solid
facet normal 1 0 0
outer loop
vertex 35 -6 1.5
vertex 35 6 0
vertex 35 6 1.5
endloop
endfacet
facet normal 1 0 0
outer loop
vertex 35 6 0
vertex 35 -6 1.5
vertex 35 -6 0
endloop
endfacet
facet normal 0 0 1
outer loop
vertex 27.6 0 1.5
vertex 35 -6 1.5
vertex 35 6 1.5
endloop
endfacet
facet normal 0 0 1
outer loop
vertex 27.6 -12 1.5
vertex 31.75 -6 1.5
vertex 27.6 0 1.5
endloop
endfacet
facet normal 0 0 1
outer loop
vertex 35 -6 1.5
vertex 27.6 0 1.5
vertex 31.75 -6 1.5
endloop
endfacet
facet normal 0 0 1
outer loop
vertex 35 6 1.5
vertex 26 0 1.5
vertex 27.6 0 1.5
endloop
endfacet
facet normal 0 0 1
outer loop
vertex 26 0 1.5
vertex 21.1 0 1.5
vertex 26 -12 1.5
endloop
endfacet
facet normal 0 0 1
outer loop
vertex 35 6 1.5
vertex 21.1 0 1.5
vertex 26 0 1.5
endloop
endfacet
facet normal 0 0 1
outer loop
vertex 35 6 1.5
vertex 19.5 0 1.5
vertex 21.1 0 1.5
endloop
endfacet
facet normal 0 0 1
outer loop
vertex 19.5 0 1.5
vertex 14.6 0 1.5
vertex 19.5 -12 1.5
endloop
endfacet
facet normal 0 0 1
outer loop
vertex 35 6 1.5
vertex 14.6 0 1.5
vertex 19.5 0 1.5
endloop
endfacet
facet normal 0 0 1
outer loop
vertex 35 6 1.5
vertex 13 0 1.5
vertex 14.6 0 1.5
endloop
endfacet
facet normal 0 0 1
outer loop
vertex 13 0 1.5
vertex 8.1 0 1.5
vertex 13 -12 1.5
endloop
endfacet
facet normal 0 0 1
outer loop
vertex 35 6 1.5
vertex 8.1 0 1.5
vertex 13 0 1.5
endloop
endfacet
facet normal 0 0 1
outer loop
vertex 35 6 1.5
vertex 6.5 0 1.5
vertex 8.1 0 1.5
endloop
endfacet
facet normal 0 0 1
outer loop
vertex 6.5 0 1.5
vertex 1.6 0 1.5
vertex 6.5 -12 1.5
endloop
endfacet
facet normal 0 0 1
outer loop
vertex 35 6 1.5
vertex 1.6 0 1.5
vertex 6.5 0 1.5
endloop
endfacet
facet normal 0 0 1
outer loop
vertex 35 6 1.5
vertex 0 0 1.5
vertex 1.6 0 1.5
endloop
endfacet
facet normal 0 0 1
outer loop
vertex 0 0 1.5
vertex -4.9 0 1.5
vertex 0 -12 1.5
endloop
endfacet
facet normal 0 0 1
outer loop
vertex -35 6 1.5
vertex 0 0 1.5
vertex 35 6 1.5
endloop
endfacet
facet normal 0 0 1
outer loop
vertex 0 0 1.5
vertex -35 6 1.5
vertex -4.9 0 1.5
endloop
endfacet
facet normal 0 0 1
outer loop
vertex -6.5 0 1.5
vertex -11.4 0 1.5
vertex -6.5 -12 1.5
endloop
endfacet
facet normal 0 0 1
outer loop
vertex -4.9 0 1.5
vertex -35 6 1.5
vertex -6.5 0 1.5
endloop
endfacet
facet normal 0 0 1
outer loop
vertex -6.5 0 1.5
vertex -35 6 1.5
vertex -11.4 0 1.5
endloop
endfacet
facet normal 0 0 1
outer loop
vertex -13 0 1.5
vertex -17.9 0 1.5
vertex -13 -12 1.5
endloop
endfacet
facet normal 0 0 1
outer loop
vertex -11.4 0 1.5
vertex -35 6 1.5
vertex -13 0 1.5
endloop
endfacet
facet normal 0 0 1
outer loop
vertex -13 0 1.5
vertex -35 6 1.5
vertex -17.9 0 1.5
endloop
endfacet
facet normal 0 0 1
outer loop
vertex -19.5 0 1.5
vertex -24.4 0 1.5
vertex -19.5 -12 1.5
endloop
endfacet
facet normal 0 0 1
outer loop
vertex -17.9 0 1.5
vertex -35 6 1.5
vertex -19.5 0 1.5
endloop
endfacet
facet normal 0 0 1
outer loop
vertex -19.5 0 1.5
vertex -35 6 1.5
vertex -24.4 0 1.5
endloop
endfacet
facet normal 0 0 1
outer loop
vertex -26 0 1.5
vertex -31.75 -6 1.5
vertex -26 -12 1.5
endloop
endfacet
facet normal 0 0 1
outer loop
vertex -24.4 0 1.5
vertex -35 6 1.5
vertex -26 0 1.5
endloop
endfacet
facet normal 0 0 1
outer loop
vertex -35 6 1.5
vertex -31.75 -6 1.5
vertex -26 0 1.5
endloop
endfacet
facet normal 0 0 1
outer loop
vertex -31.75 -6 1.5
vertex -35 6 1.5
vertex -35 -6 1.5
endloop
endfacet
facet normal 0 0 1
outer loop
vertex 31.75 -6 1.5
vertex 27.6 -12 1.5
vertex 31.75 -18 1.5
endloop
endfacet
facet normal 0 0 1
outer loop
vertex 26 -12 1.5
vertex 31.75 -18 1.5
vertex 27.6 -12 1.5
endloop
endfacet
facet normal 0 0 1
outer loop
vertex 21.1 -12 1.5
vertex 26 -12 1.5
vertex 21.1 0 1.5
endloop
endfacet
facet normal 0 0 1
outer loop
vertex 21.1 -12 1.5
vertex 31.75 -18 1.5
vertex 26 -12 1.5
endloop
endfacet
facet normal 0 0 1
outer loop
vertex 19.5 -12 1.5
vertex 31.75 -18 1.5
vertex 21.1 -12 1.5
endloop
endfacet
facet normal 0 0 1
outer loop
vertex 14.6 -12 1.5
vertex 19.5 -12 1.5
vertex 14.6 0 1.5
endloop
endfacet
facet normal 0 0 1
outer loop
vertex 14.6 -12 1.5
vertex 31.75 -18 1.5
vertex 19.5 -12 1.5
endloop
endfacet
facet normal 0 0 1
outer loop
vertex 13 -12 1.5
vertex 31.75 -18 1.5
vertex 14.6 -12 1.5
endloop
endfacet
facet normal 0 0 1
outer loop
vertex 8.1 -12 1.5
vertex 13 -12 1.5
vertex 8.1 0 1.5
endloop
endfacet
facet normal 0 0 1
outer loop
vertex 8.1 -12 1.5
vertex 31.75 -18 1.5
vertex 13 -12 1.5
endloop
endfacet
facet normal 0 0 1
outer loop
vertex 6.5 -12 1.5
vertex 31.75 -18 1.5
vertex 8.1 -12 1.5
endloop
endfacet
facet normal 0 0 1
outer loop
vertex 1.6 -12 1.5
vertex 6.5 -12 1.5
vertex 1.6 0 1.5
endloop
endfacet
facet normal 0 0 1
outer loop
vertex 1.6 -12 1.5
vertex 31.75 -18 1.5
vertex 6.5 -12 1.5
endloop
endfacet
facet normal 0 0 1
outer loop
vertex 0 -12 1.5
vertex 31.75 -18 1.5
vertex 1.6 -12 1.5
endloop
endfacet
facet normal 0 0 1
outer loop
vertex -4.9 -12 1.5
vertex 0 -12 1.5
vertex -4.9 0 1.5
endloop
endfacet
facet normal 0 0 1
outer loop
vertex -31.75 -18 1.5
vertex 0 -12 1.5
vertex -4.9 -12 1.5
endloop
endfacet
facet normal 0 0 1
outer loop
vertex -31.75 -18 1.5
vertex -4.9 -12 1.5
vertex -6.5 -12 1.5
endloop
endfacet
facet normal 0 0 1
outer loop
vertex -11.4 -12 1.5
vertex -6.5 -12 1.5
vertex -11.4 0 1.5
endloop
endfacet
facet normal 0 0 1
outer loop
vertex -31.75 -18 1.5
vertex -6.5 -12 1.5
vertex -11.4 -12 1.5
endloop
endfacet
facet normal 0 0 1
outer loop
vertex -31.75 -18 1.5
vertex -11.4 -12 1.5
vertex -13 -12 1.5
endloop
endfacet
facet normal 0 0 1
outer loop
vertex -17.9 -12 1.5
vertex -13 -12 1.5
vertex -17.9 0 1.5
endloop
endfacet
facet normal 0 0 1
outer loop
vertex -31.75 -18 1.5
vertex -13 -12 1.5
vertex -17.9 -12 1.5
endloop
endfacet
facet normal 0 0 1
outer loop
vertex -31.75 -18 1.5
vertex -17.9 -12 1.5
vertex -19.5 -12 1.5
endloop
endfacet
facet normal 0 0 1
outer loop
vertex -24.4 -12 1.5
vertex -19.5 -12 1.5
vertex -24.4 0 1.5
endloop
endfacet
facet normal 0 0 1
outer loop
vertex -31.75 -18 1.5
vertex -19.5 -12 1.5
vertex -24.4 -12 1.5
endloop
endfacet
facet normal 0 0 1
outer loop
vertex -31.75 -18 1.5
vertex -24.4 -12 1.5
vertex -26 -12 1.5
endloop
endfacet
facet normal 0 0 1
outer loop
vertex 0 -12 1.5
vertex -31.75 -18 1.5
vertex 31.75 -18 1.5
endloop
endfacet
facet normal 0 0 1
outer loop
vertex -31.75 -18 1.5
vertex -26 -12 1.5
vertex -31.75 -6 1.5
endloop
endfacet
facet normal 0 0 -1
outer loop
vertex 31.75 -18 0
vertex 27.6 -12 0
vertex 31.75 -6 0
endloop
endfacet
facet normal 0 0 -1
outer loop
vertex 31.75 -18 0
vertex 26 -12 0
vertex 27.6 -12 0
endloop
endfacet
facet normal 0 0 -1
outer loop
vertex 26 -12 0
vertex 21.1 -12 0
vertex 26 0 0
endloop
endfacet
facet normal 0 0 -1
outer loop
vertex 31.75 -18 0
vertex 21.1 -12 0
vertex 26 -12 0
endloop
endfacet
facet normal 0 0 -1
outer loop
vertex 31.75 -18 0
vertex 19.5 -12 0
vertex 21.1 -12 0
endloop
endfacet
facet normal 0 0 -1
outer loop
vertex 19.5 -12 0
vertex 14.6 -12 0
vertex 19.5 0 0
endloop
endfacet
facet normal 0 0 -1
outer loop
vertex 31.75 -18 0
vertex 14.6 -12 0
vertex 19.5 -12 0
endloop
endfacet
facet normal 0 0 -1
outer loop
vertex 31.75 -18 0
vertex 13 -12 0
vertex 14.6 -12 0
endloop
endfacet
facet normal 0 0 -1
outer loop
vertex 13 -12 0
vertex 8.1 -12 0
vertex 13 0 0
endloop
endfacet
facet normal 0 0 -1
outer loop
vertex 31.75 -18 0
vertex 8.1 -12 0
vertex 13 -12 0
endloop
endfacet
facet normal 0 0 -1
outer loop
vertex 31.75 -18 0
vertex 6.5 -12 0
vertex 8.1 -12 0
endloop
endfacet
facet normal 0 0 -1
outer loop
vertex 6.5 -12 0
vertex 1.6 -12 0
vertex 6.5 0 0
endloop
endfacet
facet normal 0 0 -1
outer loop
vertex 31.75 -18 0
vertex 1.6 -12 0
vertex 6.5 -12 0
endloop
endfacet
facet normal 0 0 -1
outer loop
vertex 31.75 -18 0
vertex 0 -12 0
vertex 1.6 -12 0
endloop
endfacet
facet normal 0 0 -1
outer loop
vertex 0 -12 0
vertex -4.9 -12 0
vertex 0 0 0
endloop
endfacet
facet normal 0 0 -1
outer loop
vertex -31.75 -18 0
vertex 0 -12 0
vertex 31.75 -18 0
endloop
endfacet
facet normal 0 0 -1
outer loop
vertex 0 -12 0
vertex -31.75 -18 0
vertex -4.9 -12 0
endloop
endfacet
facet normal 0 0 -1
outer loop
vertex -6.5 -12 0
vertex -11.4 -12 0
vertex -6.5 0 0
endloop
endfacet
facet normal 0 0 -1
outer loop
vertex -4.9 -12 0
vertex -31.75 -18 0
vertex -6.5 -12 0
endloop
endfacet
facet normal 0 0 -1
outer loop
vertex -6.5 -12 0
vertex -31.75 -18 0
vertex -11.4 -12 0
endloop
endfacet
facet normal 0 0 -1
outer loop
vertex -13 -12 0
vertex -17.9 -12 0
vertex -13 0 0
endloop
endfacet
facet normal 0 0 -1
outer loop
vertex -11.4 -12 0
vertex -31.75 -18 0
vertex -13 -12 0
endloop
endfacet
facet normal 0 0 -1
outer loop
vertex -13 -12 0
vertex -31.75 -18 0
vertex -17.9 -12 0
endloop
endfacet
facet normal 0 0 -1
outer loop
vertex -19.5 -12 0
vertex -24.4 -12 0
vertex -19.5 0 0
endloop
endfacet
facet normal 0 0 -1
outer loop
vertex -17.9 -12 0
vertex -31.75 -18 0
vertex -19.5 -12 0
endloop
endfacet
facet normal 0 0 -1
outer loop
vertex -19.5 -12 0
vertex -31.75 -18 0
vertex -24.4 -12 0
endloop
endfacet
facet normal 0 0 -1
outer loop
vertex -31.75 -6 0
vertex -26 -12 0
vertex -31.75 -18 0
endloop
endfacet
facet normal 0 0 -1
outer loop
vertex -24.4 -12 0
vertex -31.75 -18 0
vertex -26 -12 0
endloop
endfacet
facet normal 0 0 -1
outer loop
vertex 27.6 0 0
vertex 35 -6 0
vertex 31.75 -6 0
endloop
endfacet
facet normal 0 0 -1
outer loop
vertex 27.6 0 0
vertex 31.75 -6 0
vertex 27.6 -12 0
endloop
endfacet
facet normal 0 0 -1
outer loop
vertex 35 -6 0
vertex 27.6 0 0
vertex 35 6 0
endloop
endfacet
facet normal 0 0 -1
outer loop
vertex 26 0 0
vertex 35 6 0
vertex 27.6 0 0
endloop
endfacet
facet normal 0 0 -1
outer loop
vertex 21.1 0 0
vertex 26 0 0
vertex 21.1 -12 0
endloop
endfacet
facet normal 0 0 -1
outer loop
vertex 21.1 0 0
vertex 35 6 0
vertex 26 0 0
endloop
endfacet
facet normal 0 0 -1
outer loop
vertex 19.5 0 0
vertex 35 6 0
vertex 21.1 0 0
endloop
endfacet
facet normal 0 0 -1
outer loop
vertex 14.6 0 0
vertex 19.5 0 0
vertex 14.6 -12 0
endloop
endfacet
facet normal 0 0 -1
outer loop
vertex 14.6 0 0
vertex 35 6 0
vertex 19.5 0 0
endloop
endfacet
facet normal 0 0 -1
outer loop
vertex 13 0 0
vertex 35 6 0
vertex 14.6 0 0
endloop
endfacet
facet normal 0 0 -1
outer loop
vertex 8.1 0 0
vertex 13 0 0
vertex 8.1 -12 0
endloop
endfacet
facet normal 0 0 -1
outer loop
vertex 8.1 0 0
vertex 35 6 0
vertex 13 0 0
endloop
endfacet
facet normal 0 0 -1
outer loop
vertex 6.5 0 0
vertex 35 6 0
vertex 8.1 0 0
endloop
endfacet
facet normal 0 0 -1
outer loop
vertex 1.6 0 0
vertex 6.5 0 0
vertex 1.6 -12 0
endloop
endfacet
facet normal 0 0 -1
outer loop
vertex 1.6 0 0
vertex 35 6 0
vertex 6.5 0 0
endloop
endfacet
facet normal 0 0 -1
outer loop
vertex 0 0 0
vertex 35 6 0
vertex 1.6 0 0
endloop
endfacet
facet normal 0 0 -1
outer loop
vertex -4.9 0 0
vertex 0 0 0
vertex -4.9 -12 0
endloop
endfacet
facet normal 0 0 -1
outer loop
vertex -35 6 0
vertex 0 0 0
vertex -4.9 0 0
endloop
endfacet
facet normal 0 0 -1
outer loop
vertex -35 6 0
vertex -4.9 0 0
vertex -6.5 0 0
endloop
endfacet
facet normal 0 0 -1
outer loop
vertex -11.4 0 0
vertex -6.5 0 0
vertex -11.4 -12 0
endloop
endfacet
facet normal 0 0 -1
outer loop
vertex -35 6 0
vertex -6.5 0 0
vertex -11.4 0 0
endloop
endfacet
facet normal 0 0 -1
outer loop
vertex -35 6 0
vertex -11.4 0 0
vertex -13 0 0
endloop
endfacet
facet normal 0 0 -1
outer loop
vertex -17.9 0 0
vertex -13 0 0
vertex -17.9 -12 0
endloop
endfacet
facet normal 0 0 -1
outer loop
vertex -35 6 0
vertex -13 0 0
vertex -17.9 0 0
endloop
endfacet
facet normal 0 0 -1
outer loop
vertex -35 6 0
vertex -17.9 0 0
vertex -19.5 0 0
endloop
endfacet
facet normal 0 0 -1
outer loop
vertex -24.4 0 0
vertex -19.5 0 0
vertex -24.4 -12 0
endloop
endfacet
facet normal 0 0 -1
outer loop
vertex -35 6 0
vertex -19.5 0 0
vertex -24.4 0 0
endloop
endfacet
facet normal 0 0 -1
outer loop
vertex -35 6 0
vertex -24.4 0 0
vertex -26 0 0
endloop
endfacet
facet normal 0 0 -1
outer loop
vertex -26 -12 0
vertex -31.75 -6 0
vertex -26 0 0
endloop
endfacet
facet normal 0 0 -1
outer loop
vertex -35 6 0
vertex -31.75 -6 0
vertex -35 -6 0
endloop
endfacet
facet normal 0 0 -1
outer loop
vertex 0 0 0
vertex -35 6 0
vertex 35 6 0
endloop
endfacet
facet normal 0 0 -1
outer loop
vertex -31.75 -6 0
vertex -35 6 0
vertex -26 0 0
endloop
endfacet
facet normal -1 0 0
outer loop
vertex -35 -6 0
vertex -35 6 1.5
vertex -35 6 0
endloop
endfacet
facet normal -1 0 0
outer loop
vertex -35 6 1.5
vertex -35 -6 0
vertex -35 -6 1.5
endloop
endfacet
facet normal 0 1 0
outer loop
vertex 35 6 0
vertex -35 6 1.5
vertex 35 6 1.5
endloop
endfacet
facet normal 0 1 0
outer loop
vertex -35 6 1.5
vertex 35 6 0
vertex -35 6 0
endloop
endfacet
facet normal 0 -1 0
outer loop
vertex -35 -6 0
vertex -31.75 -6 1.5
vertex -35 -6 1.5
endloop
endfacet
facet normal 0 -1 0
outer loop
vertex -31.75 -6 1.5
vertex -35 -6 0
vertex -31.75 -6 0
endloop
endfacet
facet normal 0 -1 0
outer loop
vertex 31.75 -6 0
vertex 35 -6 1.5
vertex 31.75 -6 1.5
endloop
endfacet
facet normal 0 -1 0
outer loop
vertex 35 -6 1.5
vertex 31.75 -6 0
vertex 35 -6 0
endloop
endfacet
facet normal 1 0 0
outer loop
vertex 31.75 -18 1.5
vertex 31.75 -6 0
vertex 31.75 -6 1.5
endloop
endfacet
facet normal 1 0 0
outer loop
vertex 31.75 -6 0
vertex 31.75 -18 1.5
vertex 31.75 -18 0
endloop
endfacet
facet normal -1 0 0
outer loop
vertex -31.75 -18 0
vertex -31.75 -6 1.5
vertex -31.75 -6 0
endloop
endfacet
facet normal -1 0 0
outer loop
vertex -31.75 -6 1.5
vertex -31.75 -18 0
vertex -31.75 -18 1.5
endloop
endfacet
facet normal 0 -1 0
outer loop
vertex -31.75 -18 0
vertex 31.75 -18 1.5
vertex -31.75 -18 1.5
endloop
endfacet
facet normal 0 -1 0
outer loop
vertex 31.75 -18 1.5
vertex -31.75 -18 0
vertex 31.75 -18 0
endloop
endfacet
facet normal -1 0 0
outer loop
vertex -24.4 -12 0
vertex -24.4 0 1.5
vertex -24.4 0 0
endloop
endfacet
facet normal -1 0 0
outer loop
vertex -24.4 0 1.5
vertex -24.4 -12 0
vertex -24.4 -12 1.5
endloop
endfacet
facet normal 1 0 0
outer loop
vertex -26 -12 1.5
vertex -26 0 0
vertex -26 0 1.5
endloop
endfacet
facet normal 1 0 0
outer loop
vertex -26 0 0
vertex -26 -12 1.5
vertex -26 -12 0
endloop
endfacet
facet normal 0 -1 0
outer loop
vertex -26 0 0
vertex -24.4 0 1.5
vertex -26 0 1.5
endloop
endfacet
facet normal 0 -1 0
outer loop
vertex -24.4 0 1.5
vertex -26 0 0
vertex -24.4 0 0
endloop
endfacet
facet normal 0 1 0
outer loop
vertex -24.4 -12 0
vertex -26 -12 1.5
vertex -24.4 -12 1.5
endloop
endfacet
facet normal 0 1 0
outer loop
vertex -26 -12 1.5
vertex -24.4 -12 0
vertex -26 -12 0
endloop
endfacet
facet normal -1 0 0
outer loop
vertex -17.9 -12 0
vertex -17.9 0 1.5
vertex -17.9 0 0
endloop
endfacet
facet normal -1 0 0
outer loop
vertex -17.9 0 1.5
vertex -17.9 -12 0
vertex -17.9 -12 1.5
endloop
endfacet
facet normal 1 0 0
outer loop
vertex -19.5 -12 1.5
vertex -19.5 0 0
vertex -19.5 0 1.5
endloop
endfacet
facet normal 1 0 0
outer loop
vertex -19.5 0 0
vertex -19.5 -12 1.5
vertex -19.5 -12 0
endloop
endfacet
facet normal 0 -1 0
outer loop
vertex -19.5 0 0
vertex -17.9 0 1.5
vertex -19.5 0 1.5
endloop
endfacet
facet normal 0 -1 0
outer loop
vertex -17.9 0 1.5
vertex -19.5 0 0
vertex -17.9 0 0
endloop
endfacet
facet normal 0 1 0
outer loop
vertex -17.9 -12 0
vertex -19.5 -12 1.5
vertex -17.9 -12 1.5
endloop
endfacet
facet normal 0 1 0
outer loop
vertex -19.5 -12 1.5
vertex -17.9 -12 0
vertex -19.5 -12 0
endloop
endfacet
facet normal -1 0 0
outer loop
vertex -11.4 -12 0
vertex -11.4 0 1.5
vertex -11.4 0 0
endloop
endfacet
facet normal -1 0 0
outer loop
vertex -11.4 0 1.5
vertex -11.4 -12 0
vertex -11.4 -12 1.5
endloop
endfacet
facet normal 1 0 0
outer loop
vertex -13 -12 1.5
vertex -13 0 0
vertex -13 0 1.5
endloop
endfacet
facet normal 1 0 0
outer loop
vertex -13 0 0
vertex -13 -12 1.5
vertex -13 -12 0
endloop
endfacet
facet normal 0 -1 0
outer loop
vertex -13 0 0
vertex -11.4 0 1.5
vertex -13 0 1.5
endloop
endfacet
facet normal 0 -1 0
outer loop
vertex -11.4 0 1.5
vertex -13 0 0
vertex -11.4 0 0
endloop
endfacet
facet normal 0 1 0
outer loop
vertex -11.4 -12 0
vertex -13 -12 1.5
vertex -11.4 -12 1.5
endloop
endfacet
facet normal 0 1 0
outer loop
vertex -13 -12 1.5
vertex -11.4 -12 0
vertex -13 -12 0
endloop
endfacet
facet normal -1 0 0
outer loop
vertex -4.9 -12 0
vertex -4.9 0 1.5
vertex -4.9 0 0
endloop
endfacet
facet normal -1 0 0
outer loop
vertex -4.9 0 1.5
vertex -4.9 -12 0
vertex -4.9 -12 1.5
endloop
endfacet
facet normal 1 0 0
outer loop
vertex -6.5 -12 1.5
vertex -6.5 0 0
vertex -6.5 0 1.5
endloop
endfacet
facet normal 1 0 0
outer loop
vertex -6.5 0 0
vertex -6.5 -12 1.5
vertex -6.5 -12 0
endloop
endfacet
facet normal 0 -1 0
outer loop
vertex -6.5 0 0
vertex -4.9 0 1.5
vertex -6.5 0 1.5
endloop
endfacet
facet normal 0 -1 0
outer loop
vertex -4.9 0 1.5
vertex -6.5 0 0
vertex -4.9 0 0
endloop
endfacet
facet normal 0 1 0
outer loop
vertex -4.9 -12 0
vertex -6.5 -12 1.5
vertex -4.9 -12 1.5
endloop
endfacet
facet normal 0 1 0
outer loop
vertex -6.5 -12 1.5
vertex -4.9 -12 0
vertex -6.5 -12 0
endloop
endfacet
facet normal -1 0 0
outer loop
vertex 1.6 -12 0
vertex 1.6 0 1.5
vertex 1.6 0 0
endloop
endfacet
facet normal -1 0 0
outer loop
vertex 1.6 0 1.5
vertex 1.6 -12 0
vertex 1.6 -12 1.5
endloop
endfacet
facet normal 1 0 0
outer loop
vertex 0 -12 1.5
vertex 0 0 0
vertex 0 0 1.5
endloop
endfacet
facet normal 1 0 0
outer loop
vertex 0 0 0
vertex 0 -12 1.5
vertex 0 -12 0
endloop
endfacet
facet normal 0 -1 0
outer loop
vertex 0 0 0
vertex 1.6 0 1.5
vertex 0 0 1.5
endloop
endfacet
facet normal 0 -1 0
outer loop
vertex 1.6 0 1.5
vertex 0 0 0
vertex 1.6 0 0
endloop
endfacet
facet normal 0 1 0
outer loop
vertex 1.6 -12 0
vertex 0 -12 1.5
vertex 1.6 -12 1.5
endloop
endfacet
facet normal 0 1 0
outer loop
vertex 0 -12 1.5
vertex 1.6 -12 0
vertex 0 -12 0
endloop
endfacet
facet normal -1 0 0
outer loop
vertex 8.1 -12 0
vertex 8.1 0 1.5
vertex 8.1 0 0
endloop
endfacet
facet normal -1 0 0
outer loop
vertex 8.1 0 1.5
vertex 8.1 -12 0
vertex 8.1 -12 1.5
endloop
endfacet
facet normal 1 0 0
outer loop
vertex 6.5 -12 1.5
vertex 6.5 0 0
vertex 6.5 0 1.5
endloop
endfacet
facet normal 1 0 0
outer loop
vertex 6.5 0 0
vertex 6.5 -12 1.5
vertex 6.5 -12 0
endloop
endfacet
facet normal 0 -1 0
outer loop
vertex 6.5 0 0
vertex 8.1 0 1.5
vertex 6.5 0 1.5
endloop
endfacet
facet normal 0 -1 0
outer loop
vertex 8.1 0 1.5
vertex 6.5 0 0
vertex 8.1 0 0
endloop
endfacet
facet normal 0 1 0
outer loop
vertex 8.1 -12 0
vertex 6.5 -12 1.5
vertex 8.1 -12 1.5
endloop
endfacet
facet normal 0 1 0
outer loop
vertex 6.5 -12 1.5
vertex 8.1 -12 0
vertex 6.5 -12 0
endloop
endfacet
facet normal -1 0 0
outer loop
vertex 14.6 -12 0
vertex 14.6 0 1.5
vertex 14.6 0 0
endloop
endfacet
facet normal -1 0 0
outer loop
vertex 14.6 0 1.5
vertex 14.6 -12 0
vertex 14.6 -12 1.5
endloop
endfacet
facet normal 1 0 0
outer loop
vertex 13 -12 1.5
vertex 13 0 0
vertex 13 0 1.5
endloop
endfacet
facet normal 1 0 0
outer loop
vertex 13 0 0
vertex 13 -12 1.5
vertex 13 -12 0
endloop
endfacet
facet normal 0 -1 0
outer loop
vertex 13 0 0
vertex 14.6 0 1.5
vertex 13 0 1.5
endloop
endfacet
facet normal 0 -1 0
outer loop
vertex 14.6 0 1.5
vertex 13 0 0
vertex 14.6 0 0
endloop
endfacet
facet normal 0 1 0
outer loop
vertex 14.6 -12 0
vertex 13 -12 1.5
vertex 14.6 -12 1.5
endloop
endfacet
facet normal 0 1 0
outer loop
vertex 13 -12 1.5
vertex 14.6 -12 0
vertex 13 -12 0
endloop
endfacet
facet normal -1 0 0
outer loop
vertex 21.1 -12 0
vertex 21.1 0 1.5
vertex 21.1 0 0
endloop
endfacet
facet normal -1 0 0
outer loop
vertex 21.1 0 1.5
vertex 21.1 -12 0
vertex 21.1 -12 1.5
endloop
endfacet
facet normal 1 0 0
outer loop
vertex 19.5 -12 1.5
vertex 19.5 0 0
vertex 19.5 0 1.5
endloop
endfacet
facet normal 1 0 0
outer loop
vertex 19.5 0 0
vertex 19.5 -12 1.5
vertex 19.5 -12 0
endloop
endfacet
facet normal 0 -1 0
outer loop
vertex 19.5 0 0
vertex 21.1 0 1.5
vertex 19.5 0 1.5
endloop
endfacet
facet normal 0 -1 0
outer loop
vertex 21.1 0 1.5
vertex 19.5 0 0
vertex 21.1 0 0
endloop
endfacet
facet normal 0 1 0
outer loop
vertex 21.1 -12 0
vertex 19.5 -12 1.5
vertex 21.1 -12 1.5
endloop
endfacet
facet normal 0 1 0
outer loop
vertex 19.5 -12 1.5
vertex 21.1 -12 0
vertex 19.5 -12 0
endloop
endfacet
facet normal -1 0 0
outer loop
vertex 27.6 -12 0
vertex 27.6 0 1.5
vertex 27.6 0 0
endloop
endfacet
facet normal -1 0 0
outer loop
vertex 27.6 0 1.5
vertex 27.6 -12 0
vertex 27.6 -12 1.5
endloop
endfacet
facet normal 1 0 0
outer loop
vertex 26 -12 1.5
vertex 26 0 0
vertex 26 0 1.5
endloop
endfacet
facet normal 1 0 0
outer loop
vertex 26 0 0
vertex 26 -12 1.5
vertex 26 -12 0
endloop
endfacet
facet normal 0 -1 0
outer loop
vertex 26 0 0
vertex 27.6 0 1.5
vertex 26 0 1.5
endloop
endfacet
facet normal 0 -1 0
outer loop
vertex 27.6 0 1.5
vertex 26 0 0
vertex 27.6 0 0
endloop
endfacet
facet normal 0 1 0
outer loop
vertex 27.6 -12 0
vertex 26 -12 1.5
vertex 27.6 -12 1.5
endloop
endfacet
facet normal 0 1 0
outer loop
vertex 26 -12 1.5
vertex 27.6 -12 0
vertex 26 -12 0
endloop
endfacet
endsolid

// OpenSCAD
// 10-well agarose gel comb - flat plate with spine and hanging teeth.
// Orientation: Lying flat on XY plane, spine along X, teeth hanging in -Y.

// Dimensions
spine_len = 70;   // Length of the spine (X)
spine_w   = 12;   // Width of the spine (Y)
thickness = 1.5;  // Thickness of the plate (Z)

tooth_w   = 5.0;  // Width of each tooth (X)
tooth_h   = 12;   // Length of each tooth (Y)
gap       = 1.5;  // Gap between teeth (X)
n_teeth   = 10;   // Number of teeth

$fn = 64;

// Calculate total width of the tooth row
tooth_row_w = n_teeth * tooth_w + (n_teeth - 1) * gap;

// The spine is centered at X=0.
// The tooth row is centered on the spine in X, so it is also centered at X=0.
// The teeth hang from the -Y edge of the spine.
// Spine Y range: [-spine_w/2, spine_w/2] = [-6, 6].
// Teeth start at Y = -6 and extend to Y = -6 - tooth_h.

difference() {
    union() {
        // 1. The Spine
        // X: [-35, 35], Y: [-6, 6], Z: [0, 1.5]
        translate([-spine_len / 2, -spine_w / 2, 0]) 
            cube([spine_len, spine_w, thickness]);

        // 2. The Teeth Block
        // X: [-tooth_row_w/2, tooth_row_w/2]
        // Y: [-spine_w/2 - tooth_h, -spine_w/2]
        // Z: [0, thickness]
        translate([-tooth_row_w / 2, -spine_w / 2 - tooth_h, 0])
            cube([tooth_row_w, tooth_h, thickness]);
    }
    
    // Cut out the gaps between teeth
    // There are n_teeth - 1 gaps.
    // We iterate i from 0 to n_teeth - 2.
    for (i = [0 : n_teeth - 2]) {
        // Calculate X position of the gap
        // The tooth row starts at -tooth_row_w / 2.
        // Tooth 0 starts at -tooth_row_w / 2.
        // Tooth i starts at -tooth_row_w / 2 + i * (tooth_w + gap).
        // Gap i is between Tooth i and Tooth i+1.
        // Gap i starts at (Start of Tooth i) + tooth_w.
        
        row_start = -tooth_row_w / 2;
        gap_x_start = row_start + i * (tooth_w + gap) + tooth_w;
        gap_x_center = gap_x_start + gap / 2;
        
        // Cut a slot through the teeth block
        // The slot must be slightly wider than the gap to ensure clean separation.
        // We cut a rectangle of width (gap + 0.1).
        // Y range of the cut: full height of the teeth block (tooth_h).
        // Z range: extend slightly below Z=0 to ensure clean cut.
        translate([gap_x_center, -spine_w / 2 - tooth_h / 2, -0.1])
            cube([gap + 0.1, tooth_h, thickness + 0.1]);
    }
}
